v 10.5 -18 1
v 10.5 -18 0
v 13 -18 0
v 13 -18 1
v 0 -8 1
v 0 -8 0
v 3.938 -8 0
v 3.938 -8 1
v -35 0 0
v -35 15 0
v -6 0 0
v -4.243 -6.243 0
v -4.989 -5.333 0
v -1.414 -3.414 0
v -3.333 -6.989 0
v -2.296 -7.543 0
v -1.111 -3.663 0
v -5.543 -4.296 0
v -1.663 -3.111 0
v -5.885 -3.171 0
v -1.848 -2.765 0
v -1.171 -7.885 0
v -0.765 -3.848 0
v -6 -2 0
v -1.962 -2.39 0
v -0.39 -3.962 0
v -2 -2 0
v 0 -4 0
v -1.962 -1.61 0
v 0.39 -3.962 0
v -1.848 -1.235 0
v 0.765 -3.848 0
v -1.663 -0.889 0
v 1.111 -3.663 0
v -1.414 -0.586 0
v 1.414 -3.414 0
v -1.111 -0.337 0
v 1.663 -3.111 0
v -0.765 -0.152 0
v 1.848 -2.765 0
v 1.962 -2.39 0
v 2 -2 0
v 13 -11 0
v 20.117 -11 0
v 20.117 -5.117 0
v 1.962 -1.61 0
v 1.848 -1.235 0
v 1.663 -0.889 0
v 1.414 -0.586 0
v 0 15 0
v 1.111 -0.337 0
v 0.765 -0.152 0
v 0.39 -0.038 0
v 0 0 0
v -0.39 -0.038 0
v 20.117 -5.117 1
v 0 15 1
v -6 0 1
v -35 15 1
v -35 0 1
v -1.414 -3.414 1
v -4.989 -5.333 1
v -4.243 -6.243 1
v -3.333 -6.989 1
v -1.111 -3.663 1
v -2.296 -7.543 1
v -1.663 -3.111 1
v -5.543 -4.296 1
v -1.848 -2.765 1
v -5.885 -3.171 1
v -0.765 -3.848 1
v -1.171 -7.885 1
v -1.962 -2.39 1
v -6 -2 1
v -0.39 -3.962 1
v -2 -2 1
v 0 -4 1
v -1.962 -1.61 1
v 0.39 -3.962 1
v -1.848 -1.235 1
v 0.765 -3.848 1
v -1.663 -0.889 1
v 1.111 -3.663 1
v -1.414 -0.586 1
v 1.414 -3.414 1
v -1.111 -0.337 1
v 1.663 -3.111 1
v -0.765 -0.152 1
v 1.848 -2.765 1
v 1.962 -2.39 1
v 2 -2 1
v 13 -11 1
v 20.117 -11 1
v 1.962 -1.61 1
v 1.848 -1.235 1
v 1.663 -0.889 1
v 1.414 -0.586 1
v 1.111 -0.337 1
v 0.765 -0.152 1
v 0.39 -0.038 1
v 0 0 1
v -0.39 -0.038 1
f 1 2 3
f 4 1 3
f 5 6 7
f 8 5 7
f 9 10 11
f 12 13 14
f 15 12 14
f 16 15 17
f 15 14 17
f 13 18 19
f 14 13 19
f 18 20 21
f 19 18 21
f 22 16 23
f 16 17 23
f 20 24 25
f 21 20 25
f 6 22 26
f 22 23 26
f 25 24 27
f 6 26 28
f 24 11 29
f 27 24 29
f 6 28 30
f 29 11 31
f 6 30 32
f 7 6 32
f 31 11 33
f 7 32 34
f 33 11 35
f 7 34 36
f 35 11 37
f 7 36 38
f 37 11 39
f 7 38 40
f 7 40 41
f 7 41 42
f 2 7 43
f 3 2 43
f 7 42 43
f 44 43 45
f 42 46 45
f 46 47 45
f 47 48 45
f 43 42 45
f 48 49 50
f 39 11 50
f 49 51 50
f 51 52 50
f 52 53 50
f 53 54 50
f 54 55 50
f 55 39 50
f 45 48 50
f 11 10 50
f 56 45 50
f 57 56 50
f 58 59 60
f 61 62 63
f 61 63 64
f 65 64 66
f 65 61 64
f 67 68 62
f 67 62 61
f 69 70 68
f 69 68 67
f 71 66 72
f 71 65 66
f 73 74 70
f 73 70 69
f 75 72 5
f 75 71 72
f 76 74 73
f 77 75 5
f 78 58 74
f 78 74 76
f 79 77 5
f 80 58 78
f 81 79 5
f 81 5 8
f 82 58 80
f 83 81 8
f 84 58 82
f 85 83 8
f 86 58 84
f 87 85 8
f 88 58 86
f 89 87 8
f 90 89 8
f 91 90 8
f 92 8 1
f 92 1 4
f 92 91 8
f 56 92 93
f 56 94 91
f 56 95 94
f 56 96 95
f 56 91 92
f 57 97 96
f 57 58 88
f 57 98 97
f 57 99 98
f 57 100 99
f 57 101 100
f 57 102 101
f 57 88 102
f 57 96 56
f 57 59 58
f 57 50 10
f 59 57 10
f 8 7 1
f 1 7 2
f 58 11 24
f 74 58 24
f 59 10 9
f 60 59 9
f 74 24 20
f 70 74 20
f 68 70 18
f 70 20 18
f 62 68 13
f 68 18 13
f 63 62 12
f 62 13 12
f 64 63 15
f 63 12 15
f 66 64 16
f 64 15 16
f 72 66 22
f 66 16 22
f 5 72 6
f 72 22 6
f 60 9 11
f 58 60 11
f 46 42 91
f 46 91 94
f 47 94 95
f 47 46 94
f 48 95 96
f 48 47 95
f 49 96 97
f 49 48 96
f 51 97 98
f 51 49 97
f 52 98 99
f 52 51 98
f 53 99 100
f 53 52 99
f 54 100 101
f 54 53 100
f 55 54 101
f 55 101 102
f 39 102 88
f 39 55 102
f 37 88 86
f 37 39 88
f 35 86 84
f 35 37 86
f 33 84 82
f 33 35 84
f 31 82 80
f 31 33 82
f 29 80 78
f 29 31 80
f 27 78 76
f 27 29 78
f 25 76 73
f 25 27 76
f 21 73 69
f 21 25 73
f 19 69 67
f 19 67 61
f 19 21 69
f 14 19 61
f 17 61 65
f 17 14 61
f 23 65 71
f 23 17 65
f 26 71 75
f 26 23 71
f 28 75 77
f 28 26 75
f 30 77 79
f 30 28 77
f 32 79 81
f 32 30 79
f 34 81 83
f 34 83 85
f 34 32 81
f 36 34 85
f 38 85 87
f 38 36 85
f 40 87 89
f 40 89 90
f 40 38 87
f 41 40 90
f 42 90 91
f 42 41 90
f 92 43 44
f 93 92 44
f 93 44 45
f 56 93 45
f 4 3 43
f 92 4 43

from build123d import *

# Parameters (mm, degrees)
F0_R     = 2
F1_DEPTH = 1


with BuildPart() as f1:
    # F0 (on Top) → F1 (new body)
    with BuildSketch(Plane.XY):
        with BuildLine():
            Line((-35, 15), (-35, 0))
            Line((-35, 0), (-6, 0))
            Line((-6, 0), (-6, -2))
            ThreePointArc((-6, -2), (-4.242641, -6.242641), (0, -8))
            Line((0, -8), (3.9375, -8))
            Line((3.9375, -8), (10.5, -18))
            Line((10.5, -18), (13, -18))
            Line((13, -18), (13, -11))
            Line((13, -11), (20.116628, -11))
            Line((20.116628, -11), (20.116628, -5.116628))
            Line((20.116628, -5.116628), (0, 15))
            Line((0, 15), (-35, 15))
        make_face()
        with Locations((0, -2)):
            Circle(F0_R, mode=Mode.SUBTRACT)
    extrude(amount=F1_DEPTH)


solid = f1.part
